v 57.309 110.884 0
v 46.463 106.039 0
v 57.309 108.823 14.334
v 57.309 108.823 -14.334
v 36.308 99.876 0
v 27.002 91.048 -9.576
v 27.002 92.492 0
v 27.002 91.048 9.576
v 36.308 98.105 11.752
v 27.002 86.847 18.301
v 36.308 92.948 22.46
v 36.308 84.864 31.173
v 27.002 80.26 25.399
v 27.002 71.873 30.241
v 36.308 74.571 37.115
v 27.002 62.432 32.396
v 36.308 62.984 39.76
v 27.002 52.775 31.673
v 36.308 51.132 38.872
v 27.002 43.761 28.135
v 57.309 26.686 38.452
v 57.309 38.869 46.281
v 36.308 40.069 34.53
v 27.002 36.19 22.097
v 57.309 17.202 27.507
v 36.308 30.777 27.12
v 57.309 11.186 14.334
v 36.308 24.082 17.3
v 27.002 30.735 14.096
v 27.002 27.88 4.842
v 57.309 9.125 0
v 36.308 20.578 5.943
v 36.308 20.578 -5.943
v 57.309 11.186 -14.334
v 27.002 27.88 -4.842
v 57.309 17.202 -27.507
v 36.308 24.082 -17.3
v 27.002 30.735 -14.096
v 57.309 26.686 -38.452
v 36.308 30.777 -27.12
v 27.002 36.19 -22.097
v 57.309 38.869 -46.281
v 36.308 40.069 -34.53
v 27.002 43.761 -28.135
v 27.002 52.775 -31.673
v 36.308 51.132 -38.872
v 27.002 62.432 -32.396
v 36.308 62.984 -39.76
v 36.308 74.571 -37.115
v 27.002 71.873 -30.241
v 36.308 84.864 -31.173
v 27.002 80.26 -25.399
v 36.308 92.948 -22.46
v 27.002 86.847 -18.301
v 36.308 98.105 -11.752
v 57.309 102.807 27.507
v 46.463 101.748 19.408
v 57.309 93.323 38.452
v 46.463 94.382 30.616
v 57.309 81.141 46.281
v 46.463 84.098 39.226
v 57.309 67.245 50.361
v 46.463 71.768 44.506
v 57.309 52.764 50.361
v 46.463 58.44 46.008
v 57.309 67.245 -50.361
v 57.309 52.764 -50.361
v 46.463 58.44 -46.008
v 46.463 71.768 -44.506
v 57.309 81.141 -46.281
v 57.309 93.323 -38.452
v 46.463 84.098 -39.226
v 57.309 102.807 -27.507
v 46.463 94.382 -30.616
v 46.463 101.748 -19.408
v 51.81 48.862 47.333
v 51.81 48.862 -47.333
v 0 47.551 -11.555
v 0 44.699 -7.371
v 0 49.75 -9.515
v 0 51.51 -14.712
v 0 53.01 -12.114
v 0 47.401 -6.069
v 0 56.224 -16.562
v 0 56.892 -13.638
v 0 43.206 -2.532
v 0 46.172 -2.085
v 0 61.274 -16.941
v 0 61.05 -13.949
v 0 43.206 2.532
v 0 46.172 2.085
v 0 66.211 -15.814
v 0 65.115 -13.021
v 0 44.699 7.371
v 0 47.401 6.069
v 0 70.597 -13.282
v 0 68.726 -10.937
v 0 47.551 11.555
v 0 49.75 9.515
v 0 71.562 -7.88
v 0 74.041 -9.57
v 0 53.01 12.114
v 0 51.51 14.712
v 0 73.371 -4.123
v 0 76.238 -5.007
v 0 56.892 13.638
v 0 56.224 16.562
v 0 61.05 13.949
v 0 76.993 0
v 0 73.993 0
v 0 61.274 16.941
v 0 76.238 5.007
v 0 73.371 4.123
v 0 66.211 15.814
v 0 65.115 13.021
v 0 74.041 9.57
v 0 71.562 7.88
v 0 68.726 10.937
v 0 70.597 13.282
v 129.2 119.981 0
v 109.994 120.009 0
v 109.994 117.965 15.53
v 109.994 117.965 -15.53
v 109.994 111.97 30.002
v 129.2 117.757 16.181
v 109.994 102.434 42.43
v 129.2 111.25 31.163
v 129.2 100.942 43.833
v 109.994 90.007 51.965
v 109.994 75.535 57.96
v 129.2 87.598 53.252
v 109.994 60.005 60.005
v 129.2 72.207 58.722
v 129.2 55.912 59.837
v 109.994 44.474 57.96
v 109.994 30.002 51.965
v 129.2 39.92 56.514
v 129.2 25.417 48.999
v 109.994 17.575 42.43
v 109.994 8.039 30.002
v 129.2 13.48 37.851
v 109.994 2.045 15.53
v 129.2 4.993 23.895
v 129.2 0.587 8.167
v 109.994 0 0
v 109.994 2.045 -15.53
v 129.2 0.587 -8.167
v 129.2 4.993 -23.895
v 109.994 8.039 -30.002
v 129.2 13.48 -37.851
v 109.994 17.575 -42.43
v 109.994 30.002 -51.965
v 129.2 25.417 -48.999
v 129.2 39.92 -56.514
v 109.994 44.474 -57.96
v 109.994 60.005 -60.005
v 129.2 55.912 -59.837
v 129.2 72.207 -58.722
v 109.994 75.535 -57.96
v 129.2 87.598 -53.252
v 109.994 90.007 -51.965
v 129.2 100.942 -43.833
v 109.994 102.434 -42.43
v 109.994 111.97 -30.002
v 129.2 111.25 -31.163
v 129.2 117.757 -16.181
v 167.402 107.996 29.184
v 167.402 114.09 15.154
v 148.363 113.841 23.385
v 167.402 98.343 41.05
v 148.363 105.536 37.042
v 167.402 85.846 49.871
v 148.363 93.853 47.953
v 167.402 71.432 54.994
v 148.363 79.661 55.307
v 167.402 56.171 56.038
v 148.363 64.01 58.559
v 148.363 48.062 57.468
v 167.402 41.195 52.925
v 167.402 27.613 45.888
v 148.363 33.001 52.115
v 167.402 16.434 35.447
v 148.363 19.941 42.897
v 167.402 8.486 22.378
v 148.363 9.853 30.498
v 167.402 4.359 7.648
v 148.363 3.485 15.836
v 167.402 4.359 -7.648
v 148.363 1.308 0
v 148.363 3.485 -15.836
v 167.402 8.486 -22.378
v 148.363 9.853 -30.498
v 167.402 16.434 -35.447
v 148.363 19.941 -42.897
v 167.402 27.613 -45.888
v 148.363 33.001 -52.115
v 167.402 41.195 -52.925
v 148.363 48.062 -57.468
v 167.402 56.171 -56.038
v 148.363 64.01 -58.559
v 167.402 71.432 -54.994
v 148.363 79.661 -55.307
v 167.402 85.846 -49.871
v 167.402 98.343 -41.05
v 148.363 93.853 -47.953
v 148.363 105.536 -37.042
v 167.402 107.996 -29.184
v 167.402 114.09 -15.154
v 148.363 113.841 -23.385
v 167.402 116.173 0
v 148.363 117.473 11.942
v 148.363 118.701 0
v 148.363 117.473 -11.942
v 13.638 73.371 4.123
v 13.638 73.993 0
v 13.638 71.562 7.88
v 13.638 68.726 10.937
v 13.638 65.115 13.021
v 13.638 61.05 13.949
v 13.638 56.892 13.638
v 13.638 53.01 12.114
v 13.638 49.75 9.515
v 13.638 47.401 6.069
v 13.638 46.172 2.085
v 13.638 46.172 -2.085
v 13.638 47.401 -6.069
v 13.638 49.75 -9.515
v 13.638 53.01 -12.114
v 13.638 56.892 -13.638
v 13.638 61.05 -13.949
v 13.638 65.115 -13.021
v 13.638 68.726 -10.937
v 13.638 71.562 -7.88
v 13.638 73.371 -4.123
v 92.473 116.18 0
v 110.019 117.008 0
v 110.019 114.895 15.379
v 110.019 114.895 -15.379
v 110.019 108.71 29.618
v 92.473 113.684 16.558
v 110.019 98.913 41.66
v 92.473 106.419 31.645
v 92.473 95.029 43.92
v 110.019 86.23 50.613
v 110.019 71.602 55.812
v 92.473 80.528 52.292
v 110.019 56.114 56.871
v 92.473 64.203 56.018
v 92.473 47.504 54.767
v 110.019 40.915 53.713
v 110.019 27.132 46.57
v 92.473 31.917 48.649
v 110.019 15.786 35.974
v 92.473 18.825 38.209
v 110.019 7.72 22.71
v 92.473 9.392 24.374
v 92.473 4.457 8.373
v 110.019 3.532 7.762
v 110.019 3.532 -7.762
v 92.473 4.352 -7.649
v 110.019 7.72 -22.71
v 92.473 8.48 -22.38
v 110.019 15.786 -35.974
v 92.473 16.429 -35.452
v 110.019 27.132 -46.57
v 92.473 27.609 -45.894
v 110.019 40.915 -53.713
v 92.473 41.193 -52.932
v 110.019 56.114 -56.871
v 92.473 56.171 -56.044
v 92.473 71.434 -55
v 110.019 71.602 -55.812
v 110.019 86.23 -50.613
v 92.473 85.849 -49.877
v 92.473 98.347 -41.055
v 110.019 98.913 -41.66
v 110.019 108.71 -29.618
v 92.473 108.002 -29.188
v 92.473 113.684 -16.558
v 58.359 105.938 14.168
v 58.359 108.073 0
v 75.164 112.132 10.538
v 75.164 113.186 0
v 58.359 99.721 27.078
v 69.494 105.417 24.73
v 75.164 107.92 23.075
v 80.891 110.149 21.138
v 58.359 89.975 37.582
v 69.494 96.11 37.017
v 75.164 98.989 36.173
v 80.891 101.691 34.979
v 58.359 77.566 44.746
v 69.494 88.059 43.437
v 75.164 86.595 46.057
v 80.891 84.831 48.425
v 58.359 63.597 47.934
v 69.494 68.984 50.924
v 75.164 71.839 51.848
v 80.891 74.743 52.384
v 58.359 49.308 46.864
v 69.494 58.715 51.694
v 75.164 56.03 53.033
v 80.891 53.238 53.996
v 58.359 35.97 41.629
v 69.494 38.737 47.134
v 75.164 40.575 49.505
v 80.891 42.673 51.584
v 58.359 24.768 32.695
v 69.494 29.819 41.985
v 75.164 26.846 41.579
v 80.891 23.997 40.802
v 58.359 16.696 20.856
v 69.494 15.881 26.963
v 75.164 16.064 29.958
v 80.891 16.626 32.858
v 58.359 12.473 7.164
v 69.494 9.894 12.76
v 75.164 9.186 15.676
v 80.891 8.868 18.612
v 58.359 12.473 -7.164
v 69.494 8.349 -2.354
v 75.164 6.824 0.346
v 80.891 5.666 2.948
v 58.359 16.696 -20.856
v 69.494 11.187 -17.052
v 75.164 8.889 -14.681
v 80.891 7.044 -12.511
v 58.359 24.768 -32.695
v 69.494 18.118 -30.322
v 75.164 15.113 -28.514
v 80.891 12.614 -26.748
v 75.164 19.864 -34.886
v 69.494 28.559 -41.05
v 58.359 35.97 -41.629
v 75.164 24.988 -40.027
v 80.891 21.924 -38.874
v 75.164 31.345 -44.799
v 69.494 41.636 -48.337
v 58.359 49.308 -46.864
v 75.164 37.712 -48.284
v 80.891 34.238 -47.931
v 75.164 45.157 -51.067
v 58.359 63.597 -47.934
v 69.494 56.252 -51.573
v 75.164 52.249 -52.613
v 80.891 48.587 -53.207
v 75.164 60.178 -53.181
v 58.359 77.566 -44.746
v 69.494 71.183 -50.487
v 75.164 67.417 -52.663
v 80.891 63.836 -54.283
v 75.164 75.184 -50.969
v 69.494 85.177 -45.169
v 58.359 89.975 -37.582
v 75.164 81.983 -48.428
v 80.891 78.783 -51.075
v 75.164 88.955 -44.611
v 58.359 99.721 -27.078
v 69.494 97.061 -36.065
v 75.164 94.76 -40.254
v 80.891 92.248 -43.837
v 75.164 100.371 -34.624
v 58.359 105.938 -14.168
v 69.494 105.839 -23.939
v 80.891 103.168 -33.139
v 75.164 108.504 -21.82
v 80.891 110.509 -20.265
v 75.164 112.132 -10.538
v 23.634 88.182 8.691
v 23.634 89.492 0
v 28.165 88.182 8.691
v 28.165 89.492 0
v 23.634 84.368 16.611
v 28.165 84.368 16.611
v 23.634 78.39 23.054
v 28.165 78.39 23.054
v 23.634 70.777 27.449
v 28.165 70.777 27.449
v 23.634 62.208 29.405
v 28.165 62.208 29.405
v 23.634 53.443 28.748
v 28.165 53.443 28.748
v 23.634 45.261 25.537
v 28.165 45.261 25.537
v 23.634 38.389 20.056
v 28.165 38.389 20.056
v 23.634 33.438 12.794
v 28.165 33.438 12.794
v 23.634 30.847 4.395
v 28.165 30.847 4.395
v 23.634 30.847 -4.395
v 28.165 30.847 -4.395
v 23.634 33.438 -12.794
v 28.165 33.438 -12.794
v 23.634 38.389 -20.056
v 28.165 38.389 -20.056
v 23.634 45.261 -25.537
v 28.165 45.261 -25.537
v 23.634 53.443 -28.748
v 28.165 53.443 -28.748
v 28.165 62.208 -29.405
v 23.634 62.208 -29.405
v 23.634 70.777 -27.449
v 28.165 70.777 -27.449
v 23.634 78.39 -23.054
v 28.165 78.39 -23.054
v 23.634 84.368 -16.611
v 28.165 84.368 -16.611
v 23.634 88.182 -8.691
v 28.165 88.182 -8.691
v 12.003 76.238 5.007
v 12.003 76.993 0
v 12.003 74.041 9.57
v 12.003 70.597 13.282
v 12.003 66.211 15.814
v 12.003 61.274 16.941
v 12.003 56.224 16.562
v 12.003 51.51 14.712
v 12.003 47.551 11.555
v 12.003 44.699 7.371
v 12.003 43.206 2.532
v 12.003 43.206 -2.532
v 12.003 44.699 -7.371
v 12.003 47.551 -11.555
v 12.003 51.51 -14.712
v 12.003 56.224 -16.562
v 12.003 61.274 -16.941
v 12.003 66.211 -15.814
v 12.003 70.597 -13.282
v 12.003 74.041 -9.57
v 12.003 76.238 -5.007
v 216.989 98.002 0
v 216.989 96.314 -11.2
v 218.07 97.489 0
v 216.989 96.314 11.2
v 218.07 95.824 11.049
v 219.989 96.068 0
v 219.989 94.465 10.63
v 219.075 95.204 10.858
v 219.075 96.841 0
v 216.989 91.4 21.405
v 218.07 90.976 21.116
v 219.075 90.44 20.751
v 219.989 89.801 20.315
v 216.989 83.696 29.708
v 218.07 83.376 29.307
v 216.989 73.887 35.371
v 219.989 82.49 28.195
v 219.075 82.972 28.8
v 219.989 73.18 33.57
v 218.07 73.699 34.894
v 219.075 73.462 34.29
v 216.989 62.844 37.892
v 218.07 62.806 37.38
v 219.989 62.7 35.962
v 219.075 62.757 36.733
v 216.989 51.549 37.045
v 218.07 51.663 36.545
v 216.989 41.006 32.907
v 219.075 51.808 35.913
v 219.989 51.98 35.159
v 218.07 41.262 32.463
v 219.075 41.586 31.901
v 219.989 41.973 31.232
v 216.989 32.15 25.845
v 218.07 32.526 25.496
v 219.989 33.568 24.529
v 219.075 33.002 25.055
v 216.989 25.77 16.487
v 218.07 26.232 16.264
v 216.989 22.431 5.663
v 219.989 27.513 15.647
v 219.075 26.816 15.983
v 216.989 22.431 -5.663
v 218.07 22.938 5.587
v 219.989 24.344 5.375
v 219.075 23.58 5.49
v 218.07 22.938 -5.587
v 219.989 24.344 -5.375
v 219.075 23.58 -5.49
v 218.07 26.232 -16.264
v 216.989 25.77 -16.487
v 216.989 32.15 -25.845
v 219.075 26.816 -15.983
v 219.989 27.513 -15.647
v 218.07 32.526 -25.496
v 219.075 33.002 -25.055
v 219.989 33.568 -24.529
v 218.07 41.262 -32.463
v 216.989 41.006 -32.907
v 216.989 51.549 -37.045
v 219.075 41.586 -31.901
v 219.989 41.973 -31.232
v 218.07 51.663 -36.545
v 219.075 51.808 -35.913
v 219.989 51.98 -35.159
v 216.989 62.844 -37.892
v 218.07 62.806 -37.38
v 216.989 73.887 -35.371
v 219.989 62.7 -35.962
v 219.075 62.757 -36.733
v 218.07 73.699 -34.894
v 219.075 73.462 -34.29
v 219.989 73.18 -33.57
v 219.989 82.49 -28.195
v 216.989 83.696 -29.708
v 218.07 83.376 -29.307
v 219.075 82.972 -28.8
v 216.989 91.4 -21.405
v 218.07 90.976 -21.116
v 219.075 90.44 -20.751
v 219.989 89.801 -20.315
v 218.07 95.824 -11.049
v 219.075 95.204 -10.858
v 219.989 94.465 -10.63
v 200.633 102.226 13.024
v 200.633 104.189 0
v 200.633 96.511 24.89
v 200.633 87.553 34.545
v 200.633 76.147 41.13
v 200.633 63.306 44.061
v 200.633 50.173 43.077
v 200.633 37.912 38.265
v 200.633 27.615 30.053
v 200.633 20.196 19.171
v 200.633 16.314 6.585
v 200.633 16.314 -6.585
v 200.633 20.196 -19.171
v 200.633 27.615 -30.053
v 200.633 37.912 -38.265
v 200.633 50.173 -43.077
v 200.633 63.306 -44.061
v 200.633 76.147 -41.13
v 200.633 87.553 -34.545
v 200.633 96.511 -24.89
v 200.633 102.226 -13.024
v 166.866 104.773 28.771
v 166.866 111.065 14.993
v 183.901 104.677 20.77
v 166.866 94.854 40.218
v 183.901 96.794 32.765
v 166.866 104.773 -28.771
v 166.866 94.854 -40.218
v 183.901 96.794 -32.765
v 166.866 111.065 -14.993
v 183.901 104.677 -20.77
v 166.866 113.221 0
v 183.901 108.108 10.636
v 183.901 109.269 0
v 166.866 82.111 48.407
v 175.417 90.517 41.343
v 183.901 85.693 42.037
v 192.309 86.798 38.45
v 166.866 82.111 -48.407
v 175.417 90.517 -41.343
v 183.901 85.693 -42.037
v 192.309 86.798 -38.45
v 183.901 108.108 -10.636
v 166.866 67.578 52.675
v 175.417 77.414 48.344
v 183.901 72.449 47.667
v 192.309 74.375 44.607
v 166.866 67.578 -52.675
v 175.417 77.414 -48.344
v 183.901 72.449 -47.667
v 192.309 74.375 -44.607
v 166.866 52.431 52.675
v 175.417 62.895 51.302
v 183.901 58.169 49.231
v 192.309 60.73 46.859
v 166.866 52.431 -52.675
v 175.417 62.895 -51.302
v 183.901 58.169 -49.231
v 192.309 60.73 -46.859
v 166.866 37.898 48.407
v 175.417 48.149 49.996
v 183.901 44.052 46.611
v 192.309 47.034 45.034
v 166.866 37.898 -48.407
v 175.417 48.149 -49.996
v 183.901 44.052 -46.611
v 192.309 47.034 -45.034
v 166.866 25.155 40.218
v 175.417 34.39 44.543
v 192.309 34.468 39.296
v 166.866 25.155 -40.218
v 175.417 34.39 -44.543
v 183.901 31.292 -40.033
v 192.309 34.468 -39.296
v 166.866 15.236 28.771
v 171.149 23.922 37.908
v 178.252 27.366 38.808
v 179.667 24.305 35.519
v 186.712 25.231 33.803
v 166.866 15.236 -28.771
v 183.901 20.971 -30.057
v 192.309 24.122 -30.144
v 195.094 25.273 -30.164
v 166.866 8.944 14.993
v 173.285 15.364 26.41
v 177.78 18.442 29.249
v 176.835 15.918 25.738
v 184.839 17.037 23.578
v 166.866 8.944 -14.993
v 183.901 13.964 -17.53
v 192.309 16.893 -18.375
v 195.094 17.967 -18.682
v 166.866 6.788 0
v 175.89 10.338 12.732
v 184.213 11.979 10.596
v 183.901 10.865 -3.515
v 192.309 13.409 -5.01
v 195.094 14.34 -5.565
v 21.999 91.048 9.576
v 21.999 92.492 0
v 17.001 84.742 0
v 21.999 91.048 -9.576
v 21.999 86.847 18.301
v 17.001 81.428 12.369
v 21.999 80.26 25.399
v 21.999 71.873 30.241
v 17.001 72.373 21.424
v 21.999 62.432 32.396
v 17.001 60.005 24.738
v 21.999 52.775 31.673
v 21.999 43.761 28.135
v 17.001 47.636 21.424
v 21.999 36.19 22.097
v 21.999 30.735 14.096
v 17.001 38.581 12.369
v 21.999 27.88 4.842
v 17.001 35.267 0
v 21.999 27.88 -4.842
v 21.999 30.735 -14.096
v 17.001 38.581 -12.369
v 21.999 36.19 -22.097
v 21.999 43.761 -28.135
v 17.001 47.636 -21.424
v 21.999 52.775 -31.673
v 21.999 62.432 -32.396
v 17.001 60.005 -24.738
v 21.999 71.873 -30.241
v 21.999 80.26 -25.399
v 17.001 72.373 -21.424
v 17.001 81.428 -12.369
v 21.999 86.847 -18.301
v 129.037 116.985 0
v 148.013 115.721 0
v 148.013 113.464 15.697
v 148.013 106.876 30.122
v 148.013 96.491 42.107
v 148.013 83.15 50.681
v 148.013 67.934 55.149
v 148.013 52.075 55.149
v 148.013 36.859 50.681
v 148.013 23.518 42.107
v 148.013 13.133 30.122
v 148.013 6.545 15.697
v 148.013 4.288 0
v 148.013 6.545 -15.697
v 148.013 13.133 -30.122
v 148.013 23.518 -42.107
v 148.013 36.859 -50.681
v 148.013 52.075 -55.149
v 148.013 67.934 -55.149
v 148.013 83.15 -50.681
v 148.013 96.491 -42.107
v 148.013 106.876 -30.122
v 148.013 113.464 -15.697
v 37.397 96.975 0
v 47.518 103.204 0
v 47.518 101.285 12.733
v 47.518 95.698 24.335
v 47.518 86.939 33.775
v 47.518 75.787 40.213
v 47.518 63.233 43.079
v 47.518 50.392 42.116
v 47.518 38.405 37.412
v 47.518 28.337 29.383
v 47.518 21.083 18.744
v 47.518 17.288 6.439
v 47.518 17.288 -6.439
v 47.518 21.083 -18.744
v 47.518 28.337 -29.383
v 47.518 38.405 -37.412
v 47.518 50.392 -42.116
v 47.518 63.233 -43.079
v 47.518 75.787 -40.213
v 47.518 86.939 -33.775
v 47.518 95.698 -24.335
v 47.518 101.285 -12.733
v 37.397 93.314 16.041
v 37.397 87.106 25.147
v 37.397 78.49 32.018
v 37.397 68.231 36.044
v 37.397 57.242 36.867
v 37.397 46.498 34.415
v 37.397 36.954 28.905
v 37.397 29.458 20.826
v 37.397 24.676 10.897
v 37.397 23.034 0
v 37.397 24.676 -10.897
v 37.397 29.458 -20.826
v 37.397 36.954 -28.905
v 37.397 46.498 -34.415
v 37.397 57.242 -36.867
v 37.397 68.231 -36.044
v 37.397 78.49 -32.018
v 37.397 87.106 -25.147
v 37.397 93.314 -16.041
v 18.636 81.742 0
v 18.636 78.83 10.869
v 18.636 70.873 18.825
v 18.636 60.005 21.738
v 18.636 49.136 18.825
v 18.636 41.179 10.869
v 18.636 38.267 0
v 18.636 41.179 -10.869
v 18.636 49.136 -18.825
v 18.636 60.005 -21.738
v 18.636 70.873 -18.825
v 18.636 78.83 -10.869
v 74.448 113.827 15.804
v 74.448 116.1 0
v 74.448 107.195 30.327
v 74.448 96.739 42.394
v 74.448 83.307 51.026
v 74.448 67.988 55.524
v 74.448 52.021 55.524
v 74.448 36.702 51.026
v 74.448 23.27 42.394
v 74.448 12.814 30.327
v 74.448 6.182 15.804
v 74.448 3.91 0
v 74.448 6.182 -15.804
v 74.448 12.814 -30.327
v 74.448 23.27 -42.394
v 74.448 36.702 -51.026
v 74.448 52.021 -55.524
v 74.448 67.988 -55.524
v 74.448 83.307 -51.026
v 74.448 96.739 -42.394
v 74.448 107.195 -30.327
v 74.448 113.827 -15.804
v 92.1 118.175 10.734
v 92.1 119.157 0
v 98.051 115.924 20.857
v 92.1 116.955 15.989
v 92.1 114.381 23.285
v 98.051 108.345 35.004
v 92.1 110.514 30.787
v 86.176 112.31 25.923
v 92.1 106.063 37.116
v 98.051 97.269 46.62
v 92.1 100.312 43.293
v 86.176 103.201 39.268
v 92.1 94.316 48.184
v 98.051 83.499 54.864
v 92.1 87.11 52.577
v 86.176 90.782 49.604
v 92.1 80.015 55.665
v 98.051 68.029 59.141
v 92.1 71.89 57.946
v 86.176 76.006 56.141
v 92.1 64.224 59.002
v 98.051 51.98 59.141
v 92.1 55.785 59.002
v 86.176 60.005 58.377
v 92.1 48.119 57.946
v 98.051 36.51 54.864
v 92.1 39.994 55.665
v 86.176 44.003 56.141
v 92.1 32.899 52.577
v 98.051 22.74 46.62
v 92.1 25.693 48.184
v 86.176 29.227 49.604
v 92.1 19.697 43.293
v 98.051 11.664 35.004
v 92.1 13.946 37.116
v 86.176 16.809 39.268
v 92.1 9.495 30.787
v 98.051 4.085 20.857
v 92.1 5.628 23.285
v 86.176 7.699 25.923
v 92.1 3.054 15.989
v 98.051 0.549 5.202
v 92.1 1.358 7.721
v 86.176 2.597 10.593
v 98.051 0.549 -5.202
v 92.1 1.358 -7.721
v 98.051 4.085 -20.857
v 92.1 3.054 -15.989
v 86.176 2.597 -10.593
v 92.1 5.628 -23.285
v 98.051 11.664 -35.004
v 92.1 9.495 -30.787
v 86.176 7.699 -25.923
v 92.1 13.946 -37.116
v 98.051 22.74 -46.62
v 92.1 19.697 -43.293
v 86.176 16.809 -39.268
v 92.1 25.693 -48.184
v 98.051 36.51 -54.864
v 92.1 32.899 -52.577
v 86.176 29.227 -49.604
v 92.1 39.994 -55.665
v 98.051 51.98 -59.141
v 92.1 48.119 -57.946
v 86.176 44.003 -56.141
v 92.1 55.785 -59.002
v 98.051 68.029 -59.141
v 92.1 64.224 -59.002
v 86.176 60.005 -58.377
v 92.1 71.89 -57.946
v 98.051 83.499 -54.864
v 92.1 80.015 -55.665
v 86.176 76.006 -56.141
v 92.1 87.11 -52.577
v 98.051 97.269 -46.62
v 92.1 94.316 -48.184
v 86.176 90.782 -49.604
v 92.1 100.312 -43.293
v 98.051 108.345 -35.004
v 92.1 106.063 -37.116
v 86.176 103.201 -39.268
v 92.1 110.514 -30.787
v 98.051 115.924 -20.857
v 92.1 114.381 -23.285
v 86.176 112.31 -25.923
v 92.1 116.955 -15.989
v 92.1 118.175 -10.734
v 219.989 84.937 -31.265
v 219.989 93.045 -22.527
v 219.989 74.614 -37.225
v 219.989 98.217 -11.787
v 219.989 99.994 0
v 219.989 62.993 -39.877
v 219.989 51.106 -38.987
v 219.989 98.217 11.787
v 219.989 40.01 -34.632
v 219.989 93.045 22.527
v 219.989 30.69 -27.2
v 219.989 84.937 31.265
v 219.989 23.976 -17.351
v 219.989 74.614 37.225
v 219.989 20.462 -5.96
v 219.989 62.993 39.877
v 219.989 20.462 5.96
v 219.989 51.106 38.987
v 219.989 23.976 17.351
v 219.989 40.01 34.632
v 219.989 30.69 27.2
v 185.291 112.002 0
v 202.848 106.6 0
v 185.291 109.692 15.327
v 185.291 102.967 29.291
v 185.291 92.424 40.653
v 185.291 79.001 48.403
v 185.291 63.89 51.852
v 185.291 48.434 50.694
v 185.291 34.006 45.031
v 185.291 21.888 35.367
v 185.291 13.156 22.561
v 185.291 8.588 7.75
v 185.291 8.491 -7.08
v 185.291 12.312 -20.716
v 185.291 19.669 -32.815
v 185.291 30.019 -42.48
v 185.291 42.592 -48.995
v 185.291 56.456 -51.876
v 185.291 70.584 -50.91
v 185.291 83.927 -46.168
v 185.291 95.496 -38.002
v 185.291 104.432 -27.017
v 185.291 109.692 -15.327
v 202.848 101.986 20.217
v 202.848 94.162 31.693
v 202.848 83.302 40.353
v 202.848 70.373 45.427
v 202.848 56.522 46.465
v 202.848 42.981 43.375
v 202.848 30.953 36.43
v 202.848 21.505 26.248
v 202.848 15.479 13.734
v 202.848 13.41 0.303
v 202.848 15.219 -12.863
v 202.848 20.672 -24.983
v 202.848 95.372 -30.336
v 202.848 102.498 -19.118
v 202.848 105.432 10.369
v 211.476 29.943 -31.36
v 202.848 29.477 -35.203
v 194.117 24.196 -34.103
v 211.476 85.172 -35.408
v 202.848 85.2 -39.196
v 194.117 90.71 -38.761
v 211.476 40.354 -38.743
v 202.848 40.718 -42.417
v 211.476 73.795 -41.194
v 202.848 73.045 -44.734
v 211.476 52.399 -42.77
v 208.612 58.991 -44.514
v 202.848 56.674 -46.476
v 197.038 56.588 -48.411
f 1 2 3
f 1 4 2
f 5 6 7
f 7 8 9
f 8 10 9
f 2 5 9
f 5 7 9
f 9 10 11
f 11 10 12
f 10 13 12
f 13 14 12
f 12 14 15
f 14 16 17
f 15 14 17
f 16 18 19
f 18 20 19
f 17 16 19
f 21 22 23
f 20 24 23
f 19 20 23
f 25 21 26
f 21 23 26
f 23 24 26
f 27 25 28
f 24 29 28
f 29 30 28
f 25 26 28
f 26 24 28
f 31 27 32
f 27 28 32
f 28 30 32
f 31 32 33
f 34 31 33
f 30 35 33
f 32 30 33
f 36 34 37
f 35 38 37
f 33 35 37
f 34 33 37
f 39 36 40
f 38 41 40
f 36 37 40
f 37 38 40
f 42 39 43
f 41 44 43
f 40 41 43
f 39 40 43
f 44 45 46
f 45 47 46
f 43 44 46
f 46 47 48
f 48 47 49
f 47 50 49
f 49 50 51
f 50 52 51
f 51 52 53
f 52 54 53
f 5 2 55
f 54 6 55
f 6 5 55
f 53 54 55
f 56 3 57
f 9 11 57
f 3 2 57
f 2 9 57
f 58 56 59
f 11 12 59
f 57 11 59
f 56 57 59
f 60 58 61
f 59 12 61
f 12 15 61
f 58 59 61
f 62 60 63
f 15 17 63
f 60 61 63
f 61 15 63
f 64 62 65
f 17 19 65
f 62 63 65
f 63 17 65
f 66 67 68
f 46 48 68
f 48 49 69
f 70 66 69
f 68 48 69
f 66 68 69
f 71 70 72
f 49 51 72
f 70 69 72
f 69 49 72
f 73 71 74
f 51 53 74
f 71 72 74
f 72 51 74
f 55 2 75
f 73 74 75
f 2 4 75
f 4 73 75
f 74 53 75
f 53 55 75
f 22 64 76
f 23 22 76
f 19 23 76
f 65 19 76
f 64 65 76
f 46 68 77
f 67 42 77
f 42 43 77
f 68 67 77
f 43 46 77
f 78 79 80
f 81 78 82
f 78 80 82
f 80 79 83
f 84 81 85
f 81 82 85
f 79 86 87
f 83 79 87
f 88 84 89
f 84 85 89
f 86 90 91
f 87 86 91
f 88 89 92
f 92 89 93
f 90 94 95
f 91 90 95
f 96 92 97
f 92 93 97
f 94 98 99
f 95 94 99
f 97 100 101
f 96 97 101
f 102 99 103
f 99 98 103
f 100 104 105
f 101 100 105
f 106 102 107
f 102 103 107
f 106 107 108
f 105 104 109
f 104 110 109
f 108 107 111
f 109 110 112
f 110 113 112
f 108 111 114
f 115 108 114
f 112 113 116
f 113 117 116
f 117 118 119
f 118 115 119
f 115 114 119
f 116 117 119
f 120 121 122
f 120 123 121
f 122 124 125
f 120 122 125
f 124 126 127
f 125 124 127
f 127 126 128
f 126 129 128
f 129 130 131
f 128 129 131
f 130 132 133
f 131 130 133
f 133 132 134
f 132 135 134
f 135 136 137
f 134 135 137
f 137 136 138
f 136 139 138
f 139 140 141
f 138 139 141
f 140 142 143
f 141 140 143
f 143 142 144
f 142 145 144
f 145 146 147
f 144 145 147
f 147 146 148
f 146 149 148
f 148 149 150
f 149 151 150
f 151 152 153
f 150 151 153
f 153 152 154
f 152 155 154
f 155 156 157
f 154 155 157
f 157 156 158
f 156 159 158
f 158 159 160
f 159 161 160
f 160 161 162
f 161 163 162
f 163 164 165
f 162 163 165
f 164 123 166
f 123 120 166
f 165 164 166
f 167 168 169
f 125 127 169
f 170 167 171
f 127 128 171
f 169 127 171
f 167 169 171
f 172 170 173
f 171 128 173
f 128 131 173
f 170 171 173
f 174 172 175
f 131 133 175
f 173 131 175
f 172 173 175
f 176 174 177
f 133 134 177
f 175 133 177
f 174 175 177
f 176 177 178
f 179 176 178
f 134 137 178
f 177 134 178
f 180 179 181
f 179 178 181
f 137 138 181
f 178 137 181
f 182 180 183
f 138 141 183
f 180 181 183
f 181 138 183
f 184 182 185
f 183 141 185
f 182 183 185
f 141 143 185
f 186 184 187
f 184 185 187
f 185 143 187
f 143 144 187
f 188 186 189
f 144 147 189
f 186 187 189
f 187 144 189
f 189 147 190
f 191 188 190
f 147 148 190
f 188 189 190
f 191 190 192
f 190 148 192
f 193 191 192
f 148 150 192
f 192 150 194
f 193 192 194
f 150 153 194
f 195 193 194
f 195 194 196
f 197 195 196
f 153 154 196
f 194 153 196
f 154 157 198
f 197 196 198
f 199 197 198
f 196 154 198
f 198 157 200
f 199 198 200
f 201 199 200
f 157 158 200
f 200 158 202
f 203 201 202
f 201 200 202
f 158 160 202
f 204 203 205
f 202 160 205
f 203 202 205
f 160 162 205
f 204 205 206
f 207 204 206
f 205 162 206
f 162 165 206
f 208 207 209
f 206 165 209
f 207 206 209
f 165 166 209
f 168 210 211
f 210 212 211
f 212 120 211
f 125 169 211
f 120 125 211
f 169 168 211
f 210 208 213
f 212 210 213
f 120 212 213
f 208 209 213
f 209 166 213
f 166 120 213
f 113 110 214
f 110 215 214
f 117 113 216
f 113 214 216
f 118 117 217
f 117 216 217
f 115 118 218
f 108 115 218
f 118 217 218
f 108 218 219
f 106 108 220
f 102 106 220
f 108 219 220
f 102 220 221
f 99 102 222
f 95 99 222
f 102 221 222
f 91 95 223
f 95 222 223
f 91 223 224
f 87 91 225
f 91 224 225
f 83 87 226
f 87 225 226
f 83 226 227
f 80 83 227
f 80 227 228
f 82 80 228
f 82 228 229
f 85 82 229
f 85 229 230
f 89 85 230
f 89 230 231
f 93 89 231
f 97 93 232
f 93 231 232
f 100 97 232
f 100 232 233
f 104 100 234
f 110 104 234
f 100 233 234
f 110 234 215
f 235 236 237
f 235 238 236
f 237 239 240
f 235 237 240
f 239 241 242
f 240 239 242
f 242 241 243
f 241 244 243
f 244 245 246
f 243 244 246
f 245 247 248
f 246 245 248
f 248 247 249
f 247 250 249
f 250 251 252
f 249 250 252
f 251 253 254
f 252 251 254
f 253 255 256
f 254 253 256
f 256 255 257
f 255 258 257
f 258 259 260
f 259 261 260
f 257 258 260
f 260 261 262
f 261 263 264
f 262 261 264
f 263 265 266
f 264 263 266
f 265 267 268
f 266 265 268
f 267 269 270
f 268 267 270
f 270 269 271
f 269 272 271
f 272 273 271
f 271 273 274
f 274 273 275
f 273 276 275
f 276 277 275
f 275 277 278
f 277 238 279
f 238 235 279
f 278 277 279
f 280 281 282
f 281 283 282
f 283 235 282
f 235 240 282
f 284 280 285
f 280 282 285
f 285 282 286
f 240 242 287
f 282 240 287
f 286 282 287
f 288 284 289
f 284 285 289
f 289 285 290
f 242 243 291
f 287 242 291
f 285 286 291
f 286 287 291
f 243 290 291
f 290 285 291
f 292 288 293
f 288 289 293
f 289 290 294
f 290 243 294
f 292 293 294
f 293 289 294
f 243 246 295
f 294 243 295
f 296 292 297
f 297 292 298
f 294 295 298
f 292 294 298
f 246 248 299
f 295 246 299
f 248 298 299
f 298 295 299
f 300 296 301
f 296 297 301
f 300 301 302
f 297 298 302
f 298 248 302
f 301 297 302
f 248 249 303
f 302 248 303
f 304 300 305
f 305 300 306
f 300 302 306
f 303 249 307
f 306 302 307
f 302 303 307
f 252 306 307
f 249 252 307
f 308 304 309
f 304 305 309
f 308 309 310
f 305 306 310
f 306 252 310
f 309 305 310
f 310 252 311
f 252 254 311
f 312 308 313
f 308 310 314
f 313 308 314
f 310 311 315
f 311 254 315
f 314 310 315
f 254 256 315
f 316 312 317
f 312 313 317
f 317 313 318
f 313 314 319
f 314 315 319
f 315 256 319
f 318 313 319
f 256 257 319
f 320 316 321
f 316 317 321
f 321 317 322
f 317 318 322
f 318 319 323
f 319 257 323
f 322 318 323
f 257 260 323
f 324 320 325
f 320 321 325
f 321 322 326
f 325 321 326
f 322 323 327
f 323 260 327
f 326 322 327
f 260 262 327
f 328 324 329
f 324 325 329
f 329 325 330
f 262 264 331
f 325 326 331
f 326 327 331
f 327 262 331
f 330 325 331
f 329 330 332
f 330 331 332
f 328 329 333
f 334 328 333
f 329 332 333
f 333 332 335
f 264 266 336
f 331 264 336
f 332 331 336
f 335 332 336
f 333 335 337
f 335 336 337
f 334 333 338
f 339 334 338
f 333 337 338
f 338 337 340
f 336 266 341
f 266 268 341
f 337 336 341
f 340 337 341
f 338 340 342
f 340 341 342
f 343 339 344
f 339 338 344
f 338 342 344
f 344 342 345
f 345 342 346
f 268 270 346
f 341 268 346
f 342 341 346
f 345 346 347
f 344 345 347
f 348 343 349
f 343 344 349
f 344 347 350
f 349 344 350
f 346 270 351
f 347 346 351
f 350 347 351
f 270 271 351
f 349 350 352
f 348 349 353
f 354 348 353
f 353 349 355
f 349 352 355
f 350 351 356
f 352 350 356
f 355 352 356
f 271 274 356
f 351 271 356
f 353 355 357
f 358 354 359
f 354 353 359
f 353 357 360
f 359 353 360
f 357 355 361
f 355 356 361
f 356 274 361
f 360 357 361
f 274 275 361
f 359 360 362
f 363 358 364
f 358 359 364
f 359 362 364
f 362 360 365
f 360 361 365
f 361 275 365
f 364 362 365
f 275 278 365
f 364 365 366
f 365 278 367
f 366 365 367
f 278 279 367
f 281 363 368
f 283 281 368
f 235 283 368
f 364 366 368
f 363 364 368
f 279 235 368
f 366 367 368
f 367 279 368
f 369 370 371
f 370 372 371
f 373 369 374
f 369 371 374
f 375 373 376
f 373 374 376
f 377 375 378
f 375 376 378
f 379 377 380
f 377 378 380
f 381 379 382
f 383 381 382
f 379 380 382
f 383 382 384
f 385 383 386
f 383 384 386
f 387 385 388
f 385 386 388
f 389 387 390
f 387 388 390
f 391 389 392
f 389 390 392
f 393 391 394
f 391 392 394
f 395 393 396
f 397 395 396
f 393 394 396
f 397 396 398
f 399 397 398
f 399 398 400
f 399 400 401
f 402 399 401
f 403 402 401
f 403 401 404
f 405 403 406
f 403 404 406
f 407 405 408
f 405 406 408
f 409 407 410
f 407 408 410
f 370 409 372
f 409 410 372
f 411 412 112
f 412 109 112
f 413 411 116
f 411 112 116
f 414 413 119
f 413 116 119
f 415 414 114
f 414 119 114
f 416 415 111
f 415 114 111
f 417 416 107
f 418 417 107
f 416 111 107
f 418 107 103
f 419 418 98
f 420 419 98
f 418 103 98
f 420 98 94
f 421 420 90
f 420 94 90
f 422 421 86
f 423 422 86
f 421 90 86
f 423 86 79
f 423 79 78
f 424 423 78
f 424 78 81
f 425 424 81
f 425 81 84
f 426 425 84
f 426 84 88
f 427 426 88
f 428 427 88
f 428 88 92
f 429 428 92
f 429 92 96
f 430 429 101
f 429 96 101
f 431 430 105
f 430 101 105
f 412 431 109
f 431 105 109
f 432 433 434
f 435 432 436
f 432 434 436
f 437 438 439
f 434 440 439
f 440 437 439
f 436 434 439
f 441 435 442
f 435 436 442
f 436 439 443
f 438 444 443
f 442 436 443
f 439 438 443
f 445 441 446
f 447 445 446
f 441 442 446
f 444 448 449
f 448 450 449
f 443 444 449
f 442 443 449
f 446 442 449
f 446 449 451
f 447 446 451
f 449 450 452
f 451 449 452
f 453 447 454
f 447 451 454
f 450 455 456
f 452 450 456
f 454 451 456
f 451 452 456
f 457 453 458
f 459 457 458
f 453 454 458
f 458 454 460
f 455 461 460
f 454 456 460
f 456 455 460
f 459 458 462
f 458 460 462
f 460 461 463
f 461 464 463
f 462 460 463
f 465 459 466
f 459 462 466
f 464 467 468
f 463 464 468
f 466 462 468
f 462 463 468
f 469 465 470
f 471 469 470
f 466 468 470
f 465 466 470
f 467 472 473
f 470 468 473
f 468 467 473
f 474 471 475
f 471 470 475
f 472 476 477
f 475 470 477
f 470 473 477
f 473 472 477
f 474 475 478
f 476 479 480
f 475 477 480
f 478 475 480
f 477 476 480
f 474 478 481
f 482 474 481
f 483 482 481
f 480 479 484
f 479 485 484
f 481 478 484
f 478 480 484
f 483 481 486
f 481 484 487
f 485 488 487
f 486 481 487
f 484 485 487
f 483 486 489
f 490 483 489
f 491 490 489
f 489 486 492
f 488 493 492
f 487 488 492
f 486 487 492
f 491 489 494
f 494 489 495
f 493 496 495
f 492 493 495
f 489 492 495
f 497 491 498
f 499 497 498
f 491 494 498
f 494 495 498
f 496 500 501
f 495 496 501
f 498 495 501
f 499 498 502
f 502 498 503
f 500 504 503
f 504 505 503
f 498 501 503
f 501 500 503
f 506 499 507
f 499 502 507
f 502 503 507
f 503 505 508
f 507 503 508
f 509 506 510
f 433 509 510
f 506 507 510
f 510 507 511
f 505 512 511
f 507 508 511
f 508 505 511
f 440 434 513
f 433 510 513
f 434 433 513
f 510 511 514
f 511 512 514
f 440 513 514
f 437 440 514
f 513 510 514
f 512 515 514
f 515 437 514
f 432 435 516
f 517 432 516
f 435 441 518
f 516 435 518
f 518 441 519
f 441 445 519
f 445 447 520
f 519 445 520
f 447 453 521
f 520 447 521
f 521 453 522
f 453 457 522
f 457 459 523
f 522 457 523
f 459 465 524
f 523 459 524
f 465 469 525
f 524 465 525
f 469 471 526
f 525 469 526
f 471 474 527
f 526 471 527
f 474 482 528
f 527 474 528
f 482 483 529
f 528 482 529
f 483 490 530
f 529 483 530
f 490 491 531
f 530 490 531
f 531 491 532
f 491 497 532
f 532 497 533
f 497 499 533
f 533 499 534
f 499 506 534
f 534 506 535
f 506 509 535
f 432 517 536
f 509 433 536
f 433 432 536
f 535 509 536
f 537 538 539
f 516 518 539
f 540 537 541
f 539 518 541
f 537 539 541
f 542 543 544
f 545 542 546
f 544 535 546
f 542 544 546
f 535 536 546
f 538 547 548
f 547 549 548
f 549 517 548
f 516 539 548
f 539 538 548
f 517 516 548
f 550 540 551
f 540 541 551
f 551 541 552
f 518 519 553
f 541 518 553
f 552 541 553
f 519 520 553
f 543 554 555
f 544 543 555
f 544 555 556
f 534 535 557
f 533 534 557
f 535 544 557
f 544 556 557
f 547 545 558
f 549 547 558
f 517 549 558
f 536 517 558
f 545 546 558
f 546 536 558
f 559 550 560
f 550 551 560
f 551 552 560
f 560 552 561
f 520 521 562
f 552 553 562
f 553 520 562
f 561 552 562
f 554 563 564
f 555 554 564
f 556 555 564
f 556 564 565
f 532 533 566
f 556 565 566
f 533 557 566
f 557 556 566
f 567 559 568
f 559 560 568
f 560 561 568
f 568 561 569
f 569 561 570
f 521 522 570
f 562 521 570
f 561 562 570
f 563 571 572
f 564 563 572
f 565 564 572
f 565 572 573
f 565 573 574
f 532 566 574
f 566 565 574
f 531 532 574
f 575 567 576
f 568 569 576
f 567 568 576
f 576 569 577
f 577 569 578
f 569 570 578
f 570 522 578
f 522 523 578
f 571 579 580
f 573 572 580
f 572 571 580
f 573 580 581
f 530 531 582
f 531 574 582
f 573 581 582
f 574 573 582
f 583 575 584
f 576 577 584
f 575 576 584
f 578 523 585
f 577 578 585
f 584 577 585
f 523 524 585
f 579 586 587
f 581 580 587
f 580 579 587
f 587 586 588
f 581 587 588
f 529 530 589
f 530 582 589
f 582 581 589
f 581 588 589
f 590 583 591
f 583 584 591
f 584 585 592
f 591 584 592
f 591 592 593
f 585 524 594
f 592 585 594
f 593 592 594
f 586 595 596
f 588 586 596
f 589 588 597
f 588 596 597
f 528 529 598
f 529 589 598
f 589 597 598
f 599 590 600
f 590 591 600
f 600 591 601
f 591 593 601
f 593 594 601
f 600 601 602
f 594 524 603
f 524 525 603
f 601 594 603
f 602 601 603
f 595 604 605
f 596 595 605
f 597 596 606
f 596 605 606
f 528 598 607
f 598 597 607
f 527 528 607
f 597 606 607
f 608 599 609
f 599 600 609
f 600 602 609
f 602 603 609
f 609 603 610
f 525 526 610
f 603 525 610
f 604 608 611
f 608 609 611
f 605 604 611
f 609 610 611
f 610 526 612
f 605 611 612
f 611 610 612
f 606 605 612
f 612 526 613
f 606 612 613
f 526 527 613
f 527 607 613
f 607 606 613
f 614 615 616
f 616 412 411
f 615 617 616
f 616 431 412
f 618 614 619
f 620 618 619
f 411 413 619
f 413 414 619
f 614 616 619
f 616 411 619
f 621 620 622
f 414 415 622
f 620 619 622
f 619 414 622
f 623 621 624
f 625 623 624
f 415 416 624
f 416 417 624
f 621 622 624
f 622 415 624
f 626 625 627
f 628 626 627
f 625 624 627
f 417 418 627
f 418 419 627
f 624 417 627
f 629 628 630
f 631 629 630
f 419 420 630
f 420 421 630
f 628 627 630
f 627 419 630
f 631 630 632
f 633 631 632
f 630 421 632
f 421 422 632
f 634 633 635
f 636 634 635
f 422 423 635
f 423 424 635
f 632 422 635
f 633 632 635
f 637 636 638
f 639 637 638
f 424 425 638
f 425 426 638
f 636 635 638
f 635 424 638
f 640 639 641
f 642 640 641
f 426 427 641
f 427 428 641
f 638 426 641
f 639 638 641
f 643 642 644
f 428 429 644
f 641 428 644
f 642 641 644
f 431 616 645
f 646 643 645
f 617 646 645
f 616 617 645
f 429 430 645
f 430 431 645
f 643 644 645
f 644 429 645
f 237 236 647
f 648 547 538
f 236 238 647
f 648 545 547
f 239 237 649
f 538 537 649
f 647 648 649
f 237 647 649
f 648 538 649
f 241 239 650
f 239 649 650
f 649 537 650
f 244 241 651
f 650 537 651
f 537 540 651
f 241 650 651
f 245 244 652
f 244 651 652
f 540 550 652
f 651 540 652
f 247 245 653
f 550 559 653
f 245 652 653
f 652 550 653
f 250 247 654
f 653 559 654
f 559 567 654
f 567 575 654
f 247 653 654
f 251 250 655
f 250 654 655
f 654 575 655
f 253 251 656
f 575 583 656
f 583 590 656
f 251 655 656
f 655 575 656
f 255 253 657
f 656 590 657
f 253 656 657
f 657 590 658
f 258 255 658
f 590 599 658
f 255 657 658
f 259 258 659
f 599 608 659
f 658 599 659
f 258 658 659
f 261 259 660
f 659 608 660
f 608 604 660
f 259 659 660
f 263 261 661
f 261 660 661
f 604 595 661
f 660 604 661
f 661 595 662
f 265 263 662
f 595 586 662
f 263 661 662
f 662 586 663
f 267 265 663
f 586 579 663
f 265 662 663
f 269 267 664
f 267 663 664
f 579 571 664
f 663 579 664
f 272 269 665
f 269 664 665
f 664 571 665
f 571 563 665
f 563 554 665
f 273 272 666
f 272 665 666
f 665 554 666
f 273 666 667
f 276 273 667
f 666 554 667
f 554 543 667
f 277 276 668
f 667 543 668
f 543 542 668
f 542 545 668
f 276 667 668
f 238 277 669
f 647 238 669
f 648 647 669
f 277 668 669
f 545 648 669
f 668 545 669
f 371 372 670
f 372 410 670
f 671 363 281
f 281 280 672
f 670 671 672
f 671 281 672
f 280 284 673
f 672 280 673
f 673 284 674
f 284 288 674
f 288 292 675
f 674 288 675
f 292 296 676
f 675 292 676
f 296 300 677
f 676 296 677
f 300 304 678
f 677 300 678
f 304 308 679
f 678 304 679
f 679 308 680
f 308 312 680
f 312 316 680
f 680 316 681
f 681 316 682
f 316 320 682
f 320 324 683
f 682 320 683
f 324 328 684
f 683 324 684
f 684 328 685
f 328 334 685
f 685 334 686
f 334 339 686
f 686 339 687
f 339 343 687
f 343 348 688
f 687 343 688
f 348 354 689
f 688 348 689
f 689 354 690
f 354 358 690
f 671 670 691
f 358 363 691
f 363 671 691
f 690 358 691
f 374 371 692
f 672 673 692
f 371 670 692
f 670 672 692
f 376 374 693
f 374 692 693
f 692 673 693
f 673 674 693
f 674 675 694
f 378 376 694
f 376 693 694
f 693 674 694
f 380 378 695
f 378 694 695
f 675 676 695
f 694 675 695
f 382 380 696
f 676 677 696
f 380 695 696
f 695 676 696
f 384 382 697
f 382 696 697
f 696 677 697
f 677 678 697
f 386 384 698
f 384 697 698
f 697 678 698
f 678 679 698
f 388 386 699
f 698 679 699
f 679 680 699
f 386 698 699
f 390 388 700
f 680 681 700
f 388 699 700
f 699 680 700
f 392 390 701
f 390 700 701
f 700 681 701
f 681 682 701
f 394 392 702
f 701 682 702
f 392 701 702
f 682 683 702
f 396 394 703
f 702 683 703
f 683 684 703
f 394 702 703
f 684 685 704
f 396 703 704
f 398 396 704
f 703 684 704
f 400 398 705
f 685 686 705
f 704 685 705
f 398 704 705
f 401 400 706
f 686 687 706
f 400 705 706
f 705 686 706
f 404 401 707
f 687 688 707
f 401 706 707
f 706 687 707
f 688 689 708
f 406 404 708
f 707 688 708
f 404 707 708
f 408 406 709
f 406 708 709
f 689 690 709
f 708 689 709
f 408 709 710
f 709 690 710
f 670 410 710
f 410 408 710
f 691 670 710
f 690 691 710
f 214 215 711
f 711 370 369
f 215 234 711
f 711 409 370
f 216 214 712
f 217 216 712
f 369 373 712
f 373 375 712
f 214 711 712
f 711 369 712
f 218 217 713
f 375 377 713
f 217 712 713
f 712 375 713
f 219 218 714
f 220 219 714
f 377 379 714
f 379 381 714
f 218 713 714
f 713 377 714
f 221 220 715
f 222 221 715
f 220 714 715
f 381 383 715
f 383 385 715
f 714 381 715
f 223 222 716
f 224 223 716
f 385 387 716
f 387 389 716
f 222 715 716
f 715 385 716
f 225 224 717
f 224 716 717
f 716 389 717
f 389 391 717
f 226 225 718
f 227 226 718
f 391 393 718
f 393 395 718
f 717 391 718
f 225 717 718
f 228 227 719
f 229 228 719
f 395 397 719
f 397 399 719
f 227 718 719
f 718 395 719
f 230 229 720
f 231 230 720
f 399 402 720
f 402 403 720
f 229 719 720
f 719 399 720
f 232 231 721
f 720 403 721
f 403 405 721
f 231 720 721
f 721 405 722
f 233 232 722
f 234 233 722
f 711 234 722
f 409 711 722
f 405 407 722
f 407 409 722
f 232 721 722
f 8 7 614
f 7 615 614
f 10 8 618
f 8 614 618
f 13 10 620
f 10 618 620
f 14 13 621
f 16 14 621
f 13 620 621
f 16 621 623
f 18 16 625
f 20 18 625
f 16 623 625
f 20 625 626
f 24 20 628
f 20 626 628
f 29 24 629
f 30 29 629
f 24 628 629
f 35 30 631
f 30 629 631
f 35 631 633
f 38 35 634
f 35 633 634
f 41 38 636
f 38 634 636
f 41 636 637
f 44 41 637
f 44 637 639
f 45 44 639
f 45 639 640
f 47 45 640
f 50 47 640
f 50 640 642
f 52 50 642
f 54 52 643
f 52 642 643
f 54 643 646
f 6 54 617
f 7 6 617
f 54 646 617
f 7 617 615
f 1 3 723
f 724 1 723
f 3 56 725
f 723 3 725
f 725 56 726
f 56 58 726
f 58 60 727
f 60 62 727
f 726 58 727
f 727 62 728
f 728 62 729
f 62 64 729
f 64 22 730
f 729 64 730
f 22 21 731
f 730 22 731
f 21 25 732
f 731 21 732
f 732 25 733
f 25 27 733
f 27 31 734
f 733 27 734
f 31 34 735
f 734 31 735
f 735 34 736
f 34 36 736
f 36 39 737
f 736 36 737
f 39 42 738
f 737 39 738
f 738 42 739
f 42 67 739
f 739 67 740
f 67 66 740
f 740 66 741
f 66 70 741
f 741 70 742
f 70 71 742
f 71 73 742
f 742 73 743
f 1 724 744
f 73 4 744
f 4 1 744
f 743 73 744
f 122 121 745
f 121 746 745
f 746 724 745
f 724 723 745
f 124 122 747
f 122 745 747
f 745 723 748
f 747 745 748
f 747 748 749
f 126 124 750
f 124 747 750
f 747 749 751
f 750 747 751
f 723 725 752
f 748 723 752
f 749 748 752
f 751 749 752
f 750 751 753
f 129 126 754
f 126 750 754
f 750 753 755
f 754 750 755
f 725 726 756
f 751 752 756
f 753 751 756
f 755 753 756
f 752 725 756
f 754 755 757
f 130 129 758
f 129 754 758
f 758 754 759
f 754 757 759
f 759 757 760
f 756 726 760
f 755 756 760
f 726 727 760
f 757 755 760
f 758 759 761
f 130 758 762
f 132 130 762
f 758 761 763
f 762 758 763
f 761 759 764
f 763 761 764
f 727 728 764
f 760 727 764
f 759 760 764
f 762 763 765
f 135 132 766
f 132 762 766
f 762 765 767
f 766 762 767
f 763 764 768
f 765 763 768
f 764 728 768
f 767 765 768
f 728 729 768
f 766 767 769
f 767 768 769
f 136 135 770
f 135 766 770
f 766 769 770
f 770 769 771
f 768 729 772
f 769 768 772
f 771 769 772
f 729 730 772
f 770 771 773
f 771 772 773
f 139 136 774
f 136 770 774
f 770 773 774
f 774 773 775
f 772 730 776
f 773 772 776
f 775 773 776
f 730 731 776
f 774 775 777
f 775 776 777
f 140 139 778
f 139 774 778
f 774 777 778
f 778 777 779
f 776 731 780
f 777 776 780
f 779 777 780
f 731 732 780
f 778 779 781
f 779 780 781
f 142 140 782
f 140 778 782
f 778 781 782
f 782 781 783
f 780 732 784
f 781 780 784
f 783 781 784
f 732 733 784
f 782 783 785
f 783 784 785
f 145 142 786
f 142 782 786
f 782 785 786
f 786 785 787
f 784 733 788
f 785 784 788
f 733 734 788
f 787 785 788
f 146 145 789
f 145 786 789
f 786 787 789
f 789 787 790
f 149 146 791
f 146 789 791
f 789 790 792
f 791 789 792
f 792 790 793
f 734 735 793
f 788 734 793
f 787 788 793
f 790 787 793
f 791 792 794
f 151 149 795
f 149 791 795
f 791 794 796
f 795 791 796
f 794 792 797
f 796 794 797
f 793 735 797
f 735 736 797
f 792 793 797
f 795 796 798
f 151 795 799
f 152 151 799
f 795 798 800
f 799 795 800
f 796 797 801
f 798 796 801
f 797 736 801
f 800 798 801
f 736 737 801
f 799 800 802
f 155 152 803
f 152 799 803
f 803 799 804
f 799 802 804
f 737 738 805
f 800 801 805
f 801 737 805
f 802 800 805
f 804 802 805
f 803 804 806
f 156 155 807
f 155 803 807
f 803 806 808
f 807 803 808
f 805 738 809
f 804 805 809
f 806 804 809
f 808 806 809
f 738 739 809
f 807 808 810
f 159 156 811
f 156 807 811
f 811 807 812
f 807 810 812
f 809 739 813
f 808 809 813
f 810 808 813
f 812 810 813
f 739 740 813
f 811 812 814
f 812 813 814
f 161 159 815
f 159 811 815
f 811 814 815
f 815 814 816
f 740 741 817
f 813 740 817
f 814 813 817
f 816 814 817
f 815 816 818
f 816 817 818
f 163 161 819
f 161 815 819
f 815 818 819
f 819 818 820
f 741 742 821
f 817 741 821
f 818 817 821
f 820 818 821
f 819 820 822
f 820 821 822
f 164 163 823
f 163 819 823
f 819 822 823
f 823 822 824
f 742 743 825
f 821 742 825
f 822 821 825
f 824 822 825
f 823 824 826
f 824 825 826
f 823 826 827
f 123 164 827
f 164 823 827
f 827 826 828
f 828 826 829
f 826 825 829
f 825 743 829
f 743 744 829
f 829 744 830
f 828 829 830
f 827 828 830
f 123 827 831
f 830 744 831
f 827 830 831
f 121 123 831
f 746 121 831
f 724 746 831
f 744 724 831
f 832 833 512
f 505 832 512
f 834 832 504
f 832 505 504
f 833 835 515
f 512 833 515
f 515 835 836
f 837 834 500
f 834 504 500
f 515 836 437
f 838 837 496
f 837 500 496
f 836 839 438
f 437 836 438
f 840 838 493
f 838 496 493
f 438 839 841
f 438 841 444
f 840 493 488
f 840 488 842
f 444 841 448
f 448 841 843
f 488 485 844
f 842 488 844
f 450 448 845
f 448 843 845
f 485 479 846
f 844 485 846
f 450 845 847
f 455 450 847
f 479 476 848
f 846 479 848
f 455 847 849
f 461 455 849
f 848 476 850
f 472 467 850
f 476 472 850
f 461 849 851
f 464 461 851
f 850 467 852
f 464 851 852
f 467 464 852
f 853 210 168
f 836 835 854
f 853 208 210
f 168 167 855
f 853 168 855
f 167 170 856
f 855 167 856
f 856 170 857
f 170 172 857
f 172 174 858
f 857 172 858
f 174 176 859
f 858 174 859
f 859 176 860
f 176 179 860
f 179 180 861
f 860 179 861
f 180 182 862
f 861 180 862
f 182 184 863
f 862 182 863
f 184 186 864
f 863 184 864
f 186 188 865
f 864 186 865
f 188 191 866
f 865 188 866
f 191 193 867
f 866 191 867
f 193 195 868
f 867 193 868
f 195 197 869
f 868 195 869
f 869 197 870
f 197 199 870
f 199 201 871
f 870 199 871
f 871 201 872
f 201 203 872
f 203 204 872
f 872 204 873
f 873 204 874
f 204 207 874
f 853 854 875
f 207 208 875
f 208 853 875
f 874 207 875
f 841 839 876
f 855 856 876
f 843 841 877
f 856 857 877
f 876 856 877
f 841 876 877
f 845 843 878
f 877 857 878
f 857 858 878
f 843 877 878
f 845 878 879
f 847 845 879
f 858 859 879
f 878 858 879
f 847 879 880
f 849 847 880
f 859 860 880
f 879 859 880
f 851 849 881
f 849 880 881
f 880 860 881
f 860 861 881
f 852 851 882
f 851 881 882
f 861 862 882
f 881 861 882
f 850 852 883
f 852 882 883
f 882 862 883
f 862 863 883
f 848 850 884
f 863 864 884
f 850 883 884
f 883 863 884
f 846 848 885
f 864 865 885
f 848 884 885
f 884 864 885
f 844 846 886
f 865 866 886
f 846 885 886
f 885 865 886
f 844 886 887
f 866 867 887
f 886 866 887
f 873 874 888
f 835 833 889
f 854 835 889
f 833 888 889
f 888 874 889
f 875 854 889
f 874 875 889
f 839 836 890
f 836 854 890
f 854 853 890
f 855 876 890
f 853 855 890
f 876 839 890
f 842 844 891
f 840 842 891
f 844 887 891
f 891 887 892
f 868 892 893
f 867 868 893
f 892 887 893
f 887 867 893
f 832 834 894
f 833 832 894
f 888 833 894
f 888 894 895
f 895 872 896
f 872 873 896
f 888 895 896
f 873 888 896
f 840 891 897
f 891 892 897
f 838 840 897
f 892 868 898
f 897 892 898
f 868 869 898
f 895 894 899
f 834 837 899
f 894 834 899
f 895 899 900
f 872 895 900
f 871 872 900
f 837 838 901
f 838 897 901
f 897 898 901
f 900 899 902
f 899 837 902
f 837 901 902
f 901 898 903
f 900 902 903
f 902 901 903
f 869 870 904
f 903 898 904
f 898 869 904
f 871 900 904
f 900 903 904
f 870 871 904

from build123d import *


with BuildPart() as part:
    # Sketch2 → Revolve2 (revolve)
    with BuildSketch(Plane.XY):
        with BuildLine():
            Line((0, 73.992963131), (13.638295153, 73.992963131))
            Line((13.638295153, 73.992963131), (23.633885542, 89.491737237))
            Line((23.633885542, 89.491737237), (28.165268574, 89.491737237))
            ThreePointArc((28.165268574, 89.491737237), (42.356771966, 100.253637016), (58.358984334, 108.073256874))
            ThreePointArc((58.358984334, 108.073256874), (83.772170346, 114.95166298), (110.019307059, 117.008434295))
            ThreePointArc((110.019307059, 117.008434295), (138.535641093, 116.50770952), (166.866357242, 113.220985542))
            ThreePointArc((166.866357242, 113.220985542), (192.309227067, 106.869033698), (216.988579084, 98.002439021))
            ThreePointArc((216.988579084, 98.002439021), (218.582918186, 97.181325857), (219.988579084, 96.067655601))
            Line((219.988579084, 96.067655601), (219.988579084, 99.993693578))
            ThreePointArc((219.988579084, 99.993693578), (194.116843001, 109.453535678), (167.402005562, 116.173119081))
            ThreePointArc((167.402005562, 116.173119081), (138.792106802, 119.497267879), (109.994289542, 120.009120724))
            ThreePointArc((109.994289542, 120.009120724), (83.226586613, 117.901836639), (57.309483773, 110.88369253))
            ThreePointArc((57.309483773, 110.88369253), (41.288666098, 103.116731205), (27.00224631, 92.491737237))
            Line((27.00224631, 92.491737237), (21.99888089, 92.491737237))
            Line((21.99888089, 92.491737237), (12.0032905, 76.992963131))
            Line((12.0032905, 76.992963131), (0, 76.992963131))
            Line((0, 76.992963131), (0, 73.992963131))
        make_face()
    revolve(axis=Axis((0, 60.004560362, 0), (1, 0, 0)))


solid = part.part
